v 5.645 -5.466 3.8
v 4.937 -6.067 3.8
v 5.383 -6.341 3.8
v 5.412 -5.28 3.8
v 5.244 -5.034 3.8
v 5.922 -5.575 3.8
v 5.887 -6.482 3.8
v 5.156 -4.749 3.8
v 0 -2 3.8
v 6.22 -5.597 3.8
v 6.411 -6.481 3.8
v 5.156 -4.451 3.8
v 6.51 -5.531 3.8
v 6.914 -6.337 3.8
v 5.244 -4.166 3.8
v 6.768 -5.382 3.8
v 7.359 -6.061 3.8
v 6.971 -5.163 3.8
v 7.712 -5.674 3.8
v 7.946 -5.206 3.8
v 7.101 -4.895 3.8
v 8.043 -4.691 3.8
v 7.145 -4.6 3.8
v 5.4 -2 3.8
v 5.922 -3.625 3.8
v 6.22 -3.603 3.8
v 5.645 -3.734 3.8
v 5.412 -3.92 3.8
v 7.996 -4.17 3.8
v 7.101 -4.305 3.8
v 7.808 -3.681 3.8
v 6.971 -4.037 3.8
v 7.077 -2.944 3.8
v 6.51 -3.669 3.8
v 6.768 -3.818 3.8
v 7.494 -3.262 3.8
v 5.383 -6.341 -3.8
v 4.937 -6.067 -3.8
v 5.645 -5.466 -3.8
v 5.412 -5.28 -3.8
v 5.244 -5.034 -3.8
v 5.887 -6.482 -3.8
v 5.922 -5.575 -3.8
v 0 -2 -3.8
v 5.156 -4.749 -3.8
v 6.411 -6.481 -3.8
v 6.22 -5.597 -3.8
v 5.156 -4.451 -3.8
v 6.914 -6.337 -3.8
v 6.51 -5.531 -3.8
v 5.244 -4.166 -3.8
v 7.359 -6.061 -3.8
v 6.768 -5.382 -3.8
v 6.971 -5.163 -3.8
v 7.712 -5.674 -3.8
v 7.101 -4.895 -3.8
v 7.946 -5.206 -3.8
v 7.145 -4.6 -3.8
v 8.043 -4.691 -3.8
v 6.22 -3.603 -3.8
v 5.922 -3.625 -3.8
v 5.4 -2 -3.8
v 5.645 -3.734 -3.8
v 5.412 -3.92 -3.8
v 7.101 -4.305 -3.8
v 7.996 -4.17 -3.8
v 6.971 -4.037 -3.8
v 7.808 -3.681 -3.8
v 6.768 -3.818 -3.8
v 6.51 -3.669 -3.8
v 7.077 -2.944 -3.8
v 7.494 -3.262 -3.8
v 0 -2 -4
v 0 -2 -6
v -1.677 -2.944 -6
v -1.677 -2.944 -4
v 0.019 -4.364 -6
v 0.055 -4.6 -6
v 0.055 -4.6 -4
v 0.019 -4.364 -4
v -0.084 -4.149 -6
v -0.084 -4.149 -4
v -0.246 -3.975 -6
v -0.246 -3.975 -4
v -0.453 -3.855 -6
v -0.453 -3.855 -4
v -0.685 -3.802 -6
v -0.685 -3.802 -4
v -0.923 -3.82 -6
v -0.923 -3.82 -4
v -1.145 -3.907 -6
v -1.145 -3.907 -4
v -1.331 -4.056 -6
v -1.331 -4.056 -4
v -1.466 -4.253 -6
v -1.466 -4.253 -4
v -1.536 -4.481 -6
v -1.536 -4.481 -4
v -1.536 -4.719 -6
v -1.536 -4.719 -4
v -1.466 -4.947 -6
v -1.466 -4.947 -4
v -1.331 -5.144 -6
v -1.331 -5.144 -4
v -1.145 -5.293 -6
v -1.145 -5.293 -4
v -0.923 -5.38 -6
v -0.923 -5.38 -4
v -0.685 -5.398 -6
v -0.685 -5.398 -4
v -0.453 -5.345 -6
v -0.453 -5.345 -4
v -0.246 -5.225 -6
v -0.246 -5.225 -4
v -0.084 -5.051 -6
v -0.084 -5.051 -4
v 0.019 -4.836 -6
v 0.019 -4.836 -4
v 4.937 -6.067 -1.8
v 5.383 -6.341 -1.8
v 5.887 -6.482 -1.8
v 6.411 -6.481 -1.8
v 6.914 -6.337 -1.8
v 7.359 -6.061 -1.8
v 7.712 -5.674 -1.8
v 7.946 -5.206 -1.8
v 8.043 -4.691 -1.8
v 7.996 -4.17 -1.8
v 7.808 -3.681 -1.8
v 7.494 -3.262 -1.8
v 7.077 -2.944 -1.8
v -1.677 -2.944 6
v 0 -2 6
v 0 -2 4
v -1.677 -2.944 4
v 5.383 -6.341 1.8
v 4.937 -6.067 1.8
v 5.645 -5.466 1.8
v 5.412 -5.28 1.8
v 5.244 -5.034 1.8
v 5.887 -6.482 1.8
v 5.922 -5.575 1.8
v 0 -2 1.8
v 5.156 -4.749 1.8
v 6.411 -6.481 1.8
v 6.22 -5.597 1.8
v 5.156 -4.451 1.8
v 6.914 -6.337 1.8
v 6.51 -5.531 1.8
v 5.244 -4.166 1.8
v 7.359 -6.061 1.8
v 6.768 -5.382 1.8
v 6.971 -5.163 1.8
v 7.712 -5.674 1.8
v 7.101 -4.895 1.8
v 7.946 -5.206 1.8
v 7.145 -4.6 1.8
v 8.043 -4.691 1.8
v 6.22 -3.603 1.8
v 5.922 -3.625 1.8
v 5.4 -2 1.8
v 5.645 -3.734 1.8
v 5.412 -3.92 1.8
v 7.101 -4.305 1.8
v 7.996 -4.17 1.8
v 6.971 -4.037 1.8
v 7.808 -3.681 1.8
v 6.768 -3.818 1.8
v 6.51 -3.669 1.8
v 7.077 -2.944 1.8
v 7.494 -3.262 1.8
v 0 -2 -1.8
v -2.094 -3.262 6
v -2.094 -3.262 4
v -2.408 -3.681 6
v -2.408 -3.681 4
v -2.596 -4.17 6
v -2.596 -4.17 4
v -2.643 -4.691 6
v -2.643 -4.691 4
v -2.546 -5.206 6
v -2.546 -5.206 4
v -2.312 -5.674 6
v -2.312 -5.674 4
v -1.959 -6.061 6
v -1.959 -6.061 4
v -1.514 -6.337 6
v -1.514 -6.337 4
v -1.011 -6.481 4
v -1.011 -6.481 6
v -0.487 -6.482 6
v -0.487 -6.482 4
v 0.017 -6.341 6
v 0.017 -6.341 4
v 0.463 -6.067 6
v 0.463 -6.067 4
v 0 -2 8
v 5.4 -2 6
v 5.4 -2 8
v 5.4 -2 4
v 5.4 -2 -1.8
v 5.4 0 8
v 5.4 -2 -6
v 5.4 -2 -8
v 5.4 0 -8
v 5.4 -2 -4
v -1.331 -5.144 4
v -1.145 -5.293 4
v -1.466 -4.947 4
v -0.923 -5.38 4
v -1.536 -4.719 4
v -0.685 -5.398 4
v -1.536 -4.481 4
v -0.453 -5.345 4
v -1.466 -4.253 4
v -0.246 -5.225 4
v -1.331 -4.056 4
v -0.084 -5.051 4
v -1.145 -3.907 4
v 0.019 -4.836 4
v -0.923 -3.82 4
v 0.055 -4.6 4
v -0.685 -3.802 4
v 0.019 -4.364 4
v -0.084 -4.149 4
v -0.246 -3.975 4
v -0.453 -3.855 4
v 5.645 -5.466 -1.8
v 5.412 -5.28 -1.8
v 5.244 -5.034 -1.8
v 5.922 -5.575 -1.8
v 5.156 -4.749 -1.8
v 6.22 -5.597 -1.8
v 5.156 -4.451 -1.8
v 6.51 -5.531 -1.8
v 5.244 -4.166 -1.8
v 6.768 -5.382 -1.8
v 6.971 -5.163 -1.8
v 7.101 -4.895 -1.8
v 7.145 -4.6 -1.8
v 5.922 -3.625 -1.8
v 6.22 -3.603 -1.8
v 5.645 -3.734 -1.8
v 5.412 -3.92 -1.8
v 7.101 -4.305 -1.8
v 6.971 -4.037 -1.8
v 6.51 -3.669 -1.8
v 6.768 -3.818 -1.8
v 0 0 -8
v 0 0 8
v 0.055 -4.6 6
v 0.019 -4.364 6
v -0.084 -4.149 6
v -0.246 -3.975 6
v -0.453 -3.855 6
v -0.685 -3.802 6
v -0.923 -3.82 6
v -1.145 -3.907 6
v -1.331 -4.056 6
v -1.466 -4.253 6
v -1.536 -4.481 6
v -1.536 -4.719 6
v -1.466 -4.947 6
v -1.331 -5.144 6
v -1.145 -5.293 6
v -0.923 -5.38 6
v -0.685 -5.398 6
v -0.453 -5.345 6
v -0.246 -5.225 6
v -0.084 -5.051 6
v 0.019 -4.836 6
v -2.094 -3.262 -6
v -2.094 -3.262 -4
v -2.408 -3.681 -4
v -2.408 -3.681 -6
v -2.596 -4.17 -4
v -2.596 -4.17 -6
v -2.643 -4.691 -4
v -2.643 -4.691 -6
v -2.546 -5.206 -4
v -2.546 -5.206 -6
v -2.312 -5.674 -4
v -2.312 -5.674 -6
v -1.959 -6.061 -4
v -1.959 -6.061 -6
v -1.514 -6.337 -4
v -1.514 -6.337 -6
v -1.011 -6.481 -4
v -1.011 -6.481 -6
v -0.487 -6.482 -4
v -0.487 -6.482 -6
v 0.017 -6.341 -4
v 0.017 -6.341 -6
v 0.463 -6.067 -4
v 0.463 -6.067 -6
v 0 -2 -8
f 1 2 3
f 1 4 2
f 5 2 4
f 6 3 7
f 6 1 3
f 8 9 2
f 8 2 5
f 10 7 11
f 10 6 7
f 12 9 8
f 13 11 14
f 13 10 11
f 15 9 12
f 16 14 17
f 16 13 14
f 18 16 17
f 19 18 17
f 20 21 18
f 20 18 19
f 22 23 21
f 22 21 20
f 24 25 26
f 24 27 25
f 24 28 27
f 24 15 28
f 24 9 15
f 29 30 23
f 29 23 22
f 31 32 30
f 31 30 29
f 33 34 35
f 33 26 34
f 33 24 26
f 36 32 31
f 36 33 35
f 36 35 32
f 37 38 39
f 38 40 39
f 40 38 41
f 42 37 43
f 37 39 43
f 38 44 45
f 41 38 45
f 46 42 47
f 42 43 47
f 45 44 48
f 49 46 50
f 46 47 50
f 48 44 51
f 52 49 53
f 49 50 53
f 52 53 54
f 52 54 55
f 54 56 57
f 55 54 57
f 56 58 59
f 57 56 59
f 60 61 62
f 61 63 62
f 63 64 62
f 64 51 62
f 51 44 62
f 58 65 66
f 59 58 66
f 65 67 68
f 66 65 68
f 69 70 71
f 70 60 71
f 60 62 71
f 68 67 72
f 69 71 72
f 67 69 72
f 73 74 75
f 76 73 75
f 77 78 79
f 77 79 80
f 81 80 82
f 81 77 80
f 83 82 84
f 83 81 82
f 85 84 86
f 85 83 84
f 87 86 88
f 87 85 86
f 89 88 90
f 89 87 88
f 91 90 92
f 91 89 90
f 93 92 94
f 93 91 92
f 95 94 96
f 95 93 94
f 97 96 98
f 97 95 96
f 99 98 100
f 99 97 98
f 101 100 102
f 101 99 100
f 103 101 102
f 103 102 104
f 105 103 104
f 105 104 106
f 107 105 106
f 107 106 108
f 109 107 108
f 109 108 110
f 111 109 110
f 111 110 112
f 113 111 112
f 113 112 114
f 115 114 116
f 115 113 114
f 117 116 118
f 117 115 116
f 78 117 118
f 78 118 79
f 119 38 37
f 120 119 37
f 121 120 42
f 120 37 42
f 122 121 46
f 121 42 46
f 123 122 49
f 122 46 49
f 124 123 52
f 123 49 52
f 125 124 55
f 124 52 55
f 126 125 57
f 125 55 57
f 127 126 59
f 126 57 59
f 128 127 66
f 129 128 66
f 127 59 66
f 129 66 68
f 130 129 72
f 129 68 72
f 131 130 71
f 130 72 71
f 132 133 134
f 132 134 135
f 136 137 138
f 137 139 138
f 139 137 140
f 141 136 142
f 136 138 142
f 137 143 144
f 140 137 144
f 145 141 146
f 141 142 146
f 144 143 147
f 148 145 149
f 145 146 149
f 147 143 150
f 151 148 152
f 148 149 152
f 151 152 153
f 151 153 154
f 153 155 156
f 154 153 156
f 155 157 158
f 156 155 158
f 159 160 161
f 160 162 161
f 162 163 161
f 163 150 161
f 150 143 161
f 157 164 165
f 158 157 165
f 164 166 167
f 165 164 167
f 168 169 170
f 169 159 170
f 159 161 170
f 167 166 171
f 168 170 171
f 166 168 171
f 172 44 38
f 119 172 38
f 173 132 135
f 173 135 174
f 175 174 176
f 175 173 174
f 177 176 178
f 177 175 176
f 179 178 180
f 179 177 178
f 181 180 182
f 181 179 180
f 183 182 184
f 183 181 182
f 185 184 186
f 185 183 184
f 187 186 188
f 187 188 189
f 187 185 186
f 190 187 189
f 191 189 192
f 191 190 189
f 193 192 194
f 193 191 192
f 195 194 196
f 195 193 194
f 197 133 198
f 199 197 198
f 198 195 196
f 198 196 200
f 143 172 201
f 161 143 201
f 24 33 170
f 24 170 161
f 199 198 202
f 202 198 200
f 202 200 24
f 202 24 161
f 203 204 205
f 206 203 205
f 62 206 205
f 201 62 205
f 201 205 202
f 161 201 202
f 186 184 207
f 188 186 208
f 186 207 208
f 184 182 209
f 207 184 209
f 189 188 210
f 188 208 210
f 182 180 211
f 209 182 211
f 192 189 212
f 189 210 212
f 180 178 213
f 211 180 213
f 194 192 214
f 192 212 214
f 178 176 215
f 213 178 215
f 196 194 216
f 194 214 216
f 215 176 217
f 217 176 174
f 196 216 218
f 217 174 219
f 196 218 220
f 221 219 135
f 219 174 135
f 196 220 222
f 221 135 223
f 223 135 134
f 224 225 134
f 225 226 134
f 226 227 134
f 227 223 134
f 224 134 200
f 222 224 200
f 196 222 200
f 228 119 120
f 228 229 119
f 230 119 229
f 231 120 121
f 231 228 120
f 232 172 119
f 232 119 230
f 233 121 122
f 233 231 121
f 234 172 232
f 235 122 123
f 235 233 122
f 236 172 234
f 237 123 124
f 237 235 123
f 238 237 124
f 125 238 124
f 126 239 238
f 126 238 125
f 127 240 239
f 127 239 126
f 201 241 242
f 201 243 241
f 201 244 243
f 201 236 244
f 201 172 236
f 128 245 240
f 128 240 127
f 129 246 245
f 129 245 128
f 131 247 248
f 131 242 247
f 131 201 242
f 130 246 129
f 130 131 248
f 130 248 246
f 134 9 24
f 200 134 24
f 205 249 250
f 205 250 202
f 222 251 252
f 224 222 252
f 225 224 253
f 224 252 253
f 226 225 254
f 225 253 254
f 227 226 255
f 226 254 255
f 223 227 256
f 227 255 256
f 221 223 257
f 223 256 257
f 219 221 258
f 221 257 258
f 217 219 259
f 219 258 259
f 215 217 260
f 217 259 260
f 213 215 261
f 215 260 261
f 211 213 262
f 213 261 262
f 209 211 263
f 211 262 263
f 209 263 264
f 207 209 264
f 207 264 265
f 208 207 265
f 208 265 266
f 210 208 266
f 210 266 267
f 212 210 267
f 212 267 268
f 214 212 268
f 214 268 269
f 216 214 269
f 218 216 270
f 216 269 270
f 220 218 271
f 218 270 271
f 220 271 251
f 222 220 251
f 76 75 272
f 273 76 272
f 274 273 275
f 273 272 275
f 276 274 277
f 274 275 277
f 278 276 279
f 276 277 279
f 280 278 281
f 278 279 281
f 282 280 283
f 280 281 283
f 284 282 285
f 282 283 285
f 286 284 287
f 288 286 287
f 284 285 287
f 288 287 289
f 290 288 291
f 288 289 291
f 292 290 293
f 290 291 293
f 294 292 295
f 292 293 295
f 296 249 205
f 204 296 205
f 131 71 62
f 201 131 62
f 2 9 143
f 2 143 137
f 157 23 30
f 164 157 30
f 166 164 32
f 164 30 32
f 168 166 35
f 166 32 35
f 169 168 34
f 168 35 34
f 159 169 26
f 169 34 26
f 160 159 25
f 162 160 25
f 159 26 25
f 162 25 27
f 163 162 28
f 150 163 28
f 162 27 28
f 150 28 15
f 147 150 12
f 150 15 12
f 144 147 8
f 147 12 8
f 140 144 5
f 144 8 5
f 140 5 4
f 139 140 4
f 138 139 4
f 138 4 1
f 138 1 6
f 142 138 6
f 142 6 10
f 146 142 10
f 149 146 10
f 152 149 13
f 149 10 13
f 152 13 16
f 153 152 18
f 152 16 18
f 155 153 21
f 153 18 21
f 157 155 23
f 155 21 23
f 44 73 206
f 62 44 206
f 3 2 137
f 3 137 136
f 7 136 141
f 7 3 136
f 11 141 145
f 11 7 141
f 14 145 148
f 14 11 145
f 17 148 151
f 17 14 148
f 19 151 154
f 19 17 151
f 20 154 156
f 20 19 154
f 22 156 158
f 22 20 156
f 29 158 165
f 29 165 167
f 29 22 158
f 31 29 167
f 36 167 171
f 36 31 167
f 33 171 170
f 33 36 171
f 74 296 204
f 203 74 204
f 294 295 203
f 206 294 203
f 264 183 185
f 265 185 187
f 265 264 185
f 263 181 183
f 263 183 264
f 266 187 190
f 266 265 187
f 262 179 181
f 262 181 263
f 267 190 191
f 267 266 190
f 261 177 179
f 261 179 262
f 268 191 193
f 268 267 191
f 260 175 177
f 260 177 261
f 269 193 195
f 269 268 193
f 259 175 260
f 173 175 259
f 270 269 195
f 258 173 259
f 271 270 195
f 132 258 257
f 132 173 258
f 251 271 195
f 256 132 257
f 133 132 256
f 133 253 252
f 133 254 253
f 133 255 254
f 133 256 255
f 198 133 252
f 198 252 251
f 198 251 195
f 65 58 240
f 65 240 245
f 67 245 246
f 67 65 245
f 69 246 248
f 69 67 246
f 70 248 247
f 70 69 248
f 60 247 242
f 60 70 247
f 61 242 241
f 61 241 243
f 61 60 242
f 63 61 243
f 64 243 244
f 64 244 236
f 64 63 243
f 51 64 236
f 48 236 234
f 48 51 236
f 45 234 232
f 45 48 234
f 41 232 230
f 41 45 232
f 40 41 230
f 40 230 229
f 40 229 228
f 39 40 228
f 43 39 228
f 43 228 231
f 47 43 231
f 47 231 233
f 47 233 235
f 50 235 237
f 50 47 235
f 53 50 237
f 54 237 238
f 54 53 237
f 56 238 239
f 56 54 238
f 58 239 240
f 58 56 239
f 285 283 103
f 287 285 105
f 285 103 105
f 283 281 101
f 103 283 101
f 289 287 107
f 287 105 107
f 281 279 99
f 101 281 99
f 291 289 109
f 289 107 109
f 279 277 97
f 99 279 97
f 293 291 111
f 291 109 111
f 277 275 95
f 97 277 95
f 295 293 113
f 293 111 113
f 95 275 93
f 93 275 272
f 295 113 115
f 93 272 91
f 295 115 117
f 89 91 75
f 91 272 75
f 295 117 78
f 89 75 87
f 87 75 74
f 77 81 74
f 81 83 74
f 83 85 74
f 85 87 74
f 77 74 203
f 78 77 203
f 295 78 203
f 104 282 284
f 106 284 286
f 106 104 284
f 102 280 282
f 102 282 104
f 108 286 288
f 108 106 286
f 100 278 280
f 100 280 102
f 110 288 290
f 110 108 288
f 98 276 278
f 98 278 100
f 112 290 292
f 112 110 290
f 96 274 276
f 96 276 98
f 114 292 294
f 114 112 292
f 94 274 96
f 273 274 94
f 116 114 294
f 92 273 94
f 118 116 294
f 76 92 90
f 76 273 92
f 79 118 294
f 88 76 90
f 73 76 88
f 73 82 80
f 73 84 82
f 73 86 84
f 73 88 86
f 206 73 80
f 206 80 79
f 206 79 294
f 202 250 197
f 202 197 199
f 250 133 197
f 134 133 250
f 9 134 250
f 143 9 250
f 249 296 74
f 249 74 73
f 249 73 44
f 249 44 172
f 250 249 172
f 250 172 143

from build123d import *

# Parameters (mm, degrees)
EXTRUDE_1_DEPTH      = 8
EXTRUDE_1_DEPTH_BACK = 8
SKETCH_1_W           = 5.4
SKETCH_1_H           = 2
SKETCH_3_R           = 0.8
EXTRUDE_2_DEPTH      = 2
SKETCH_5_R           = 1
EXTRUDE_3_DEPTH      = 2


with BuildPart() as part:
    # 草图1 → 凸台-拉伸1 (new, two sides: drawn at the far end of the back side and taken through both)
    with BuildSketch(Plane.XY.offset(-EXTRUDE_1_DEPTH_BACK)):
        with Locations((2.7, -1)):
            Rectangle(SKETCH_1_W, SKETCH_1_H)
    extrude(amount=EXTRUDE_1_DEPTH + EXTRUDE_1_DEPTH_BACK)

    # 草图3 → 凸台-拉伸2 (add)
    with BuildSketch(Plane.XY.offset(6)):
        with BuildLine():
            Line((5.4, -2), (0, -2))
            Line((0, -2), (-1.677229227, -2.944418933))
            ThreePointArc((-1.677229227, -2.944418933), (-2.312144702, -5.674270675), (0.462980792, -6.066554604))
            Line((0.462980792, -6.066554604), (5.4, -2))
        make_face()
        with Locations((-0.745, -4.6)):
            Circle(SKETCH_3_R, mode=Mode.SUBTRACT)
    extrude_2 = extrude(amount=-EXTRUDE_2_DEPTH)

    # 草图5 → 凸台-拉伸3 (add)
    with BuildSketch(Plane.XY.offset(3.8)):
        with BuildLine():
            Line((7.077229227, -2.944418933), (5.4, -2))
            Line((5.4, -2), (0, -2))
            Line((0, -2), (4.937019208, -6.066554604))
            ThreePointArc((4.937019208, -6.066554604), (7.712144702, -5.674270675), (7.077229227, -2.944418933))
        make_face()
        with Locations((6.145, -4.6)):
            Circle(SKETCH_5_R, mode=Mode.SUBTRACT)
    extrude_3 = extrude(amount=-EXTRUDE_3_DEPTH)

    # 镜向1: 凸台-拉伸2, 凸台-拉伸3 across plane
    add(extrude_2.mirror(Plane.XY))
    add(extrude_3.mirror(Plane.XY))


solid = part.part
